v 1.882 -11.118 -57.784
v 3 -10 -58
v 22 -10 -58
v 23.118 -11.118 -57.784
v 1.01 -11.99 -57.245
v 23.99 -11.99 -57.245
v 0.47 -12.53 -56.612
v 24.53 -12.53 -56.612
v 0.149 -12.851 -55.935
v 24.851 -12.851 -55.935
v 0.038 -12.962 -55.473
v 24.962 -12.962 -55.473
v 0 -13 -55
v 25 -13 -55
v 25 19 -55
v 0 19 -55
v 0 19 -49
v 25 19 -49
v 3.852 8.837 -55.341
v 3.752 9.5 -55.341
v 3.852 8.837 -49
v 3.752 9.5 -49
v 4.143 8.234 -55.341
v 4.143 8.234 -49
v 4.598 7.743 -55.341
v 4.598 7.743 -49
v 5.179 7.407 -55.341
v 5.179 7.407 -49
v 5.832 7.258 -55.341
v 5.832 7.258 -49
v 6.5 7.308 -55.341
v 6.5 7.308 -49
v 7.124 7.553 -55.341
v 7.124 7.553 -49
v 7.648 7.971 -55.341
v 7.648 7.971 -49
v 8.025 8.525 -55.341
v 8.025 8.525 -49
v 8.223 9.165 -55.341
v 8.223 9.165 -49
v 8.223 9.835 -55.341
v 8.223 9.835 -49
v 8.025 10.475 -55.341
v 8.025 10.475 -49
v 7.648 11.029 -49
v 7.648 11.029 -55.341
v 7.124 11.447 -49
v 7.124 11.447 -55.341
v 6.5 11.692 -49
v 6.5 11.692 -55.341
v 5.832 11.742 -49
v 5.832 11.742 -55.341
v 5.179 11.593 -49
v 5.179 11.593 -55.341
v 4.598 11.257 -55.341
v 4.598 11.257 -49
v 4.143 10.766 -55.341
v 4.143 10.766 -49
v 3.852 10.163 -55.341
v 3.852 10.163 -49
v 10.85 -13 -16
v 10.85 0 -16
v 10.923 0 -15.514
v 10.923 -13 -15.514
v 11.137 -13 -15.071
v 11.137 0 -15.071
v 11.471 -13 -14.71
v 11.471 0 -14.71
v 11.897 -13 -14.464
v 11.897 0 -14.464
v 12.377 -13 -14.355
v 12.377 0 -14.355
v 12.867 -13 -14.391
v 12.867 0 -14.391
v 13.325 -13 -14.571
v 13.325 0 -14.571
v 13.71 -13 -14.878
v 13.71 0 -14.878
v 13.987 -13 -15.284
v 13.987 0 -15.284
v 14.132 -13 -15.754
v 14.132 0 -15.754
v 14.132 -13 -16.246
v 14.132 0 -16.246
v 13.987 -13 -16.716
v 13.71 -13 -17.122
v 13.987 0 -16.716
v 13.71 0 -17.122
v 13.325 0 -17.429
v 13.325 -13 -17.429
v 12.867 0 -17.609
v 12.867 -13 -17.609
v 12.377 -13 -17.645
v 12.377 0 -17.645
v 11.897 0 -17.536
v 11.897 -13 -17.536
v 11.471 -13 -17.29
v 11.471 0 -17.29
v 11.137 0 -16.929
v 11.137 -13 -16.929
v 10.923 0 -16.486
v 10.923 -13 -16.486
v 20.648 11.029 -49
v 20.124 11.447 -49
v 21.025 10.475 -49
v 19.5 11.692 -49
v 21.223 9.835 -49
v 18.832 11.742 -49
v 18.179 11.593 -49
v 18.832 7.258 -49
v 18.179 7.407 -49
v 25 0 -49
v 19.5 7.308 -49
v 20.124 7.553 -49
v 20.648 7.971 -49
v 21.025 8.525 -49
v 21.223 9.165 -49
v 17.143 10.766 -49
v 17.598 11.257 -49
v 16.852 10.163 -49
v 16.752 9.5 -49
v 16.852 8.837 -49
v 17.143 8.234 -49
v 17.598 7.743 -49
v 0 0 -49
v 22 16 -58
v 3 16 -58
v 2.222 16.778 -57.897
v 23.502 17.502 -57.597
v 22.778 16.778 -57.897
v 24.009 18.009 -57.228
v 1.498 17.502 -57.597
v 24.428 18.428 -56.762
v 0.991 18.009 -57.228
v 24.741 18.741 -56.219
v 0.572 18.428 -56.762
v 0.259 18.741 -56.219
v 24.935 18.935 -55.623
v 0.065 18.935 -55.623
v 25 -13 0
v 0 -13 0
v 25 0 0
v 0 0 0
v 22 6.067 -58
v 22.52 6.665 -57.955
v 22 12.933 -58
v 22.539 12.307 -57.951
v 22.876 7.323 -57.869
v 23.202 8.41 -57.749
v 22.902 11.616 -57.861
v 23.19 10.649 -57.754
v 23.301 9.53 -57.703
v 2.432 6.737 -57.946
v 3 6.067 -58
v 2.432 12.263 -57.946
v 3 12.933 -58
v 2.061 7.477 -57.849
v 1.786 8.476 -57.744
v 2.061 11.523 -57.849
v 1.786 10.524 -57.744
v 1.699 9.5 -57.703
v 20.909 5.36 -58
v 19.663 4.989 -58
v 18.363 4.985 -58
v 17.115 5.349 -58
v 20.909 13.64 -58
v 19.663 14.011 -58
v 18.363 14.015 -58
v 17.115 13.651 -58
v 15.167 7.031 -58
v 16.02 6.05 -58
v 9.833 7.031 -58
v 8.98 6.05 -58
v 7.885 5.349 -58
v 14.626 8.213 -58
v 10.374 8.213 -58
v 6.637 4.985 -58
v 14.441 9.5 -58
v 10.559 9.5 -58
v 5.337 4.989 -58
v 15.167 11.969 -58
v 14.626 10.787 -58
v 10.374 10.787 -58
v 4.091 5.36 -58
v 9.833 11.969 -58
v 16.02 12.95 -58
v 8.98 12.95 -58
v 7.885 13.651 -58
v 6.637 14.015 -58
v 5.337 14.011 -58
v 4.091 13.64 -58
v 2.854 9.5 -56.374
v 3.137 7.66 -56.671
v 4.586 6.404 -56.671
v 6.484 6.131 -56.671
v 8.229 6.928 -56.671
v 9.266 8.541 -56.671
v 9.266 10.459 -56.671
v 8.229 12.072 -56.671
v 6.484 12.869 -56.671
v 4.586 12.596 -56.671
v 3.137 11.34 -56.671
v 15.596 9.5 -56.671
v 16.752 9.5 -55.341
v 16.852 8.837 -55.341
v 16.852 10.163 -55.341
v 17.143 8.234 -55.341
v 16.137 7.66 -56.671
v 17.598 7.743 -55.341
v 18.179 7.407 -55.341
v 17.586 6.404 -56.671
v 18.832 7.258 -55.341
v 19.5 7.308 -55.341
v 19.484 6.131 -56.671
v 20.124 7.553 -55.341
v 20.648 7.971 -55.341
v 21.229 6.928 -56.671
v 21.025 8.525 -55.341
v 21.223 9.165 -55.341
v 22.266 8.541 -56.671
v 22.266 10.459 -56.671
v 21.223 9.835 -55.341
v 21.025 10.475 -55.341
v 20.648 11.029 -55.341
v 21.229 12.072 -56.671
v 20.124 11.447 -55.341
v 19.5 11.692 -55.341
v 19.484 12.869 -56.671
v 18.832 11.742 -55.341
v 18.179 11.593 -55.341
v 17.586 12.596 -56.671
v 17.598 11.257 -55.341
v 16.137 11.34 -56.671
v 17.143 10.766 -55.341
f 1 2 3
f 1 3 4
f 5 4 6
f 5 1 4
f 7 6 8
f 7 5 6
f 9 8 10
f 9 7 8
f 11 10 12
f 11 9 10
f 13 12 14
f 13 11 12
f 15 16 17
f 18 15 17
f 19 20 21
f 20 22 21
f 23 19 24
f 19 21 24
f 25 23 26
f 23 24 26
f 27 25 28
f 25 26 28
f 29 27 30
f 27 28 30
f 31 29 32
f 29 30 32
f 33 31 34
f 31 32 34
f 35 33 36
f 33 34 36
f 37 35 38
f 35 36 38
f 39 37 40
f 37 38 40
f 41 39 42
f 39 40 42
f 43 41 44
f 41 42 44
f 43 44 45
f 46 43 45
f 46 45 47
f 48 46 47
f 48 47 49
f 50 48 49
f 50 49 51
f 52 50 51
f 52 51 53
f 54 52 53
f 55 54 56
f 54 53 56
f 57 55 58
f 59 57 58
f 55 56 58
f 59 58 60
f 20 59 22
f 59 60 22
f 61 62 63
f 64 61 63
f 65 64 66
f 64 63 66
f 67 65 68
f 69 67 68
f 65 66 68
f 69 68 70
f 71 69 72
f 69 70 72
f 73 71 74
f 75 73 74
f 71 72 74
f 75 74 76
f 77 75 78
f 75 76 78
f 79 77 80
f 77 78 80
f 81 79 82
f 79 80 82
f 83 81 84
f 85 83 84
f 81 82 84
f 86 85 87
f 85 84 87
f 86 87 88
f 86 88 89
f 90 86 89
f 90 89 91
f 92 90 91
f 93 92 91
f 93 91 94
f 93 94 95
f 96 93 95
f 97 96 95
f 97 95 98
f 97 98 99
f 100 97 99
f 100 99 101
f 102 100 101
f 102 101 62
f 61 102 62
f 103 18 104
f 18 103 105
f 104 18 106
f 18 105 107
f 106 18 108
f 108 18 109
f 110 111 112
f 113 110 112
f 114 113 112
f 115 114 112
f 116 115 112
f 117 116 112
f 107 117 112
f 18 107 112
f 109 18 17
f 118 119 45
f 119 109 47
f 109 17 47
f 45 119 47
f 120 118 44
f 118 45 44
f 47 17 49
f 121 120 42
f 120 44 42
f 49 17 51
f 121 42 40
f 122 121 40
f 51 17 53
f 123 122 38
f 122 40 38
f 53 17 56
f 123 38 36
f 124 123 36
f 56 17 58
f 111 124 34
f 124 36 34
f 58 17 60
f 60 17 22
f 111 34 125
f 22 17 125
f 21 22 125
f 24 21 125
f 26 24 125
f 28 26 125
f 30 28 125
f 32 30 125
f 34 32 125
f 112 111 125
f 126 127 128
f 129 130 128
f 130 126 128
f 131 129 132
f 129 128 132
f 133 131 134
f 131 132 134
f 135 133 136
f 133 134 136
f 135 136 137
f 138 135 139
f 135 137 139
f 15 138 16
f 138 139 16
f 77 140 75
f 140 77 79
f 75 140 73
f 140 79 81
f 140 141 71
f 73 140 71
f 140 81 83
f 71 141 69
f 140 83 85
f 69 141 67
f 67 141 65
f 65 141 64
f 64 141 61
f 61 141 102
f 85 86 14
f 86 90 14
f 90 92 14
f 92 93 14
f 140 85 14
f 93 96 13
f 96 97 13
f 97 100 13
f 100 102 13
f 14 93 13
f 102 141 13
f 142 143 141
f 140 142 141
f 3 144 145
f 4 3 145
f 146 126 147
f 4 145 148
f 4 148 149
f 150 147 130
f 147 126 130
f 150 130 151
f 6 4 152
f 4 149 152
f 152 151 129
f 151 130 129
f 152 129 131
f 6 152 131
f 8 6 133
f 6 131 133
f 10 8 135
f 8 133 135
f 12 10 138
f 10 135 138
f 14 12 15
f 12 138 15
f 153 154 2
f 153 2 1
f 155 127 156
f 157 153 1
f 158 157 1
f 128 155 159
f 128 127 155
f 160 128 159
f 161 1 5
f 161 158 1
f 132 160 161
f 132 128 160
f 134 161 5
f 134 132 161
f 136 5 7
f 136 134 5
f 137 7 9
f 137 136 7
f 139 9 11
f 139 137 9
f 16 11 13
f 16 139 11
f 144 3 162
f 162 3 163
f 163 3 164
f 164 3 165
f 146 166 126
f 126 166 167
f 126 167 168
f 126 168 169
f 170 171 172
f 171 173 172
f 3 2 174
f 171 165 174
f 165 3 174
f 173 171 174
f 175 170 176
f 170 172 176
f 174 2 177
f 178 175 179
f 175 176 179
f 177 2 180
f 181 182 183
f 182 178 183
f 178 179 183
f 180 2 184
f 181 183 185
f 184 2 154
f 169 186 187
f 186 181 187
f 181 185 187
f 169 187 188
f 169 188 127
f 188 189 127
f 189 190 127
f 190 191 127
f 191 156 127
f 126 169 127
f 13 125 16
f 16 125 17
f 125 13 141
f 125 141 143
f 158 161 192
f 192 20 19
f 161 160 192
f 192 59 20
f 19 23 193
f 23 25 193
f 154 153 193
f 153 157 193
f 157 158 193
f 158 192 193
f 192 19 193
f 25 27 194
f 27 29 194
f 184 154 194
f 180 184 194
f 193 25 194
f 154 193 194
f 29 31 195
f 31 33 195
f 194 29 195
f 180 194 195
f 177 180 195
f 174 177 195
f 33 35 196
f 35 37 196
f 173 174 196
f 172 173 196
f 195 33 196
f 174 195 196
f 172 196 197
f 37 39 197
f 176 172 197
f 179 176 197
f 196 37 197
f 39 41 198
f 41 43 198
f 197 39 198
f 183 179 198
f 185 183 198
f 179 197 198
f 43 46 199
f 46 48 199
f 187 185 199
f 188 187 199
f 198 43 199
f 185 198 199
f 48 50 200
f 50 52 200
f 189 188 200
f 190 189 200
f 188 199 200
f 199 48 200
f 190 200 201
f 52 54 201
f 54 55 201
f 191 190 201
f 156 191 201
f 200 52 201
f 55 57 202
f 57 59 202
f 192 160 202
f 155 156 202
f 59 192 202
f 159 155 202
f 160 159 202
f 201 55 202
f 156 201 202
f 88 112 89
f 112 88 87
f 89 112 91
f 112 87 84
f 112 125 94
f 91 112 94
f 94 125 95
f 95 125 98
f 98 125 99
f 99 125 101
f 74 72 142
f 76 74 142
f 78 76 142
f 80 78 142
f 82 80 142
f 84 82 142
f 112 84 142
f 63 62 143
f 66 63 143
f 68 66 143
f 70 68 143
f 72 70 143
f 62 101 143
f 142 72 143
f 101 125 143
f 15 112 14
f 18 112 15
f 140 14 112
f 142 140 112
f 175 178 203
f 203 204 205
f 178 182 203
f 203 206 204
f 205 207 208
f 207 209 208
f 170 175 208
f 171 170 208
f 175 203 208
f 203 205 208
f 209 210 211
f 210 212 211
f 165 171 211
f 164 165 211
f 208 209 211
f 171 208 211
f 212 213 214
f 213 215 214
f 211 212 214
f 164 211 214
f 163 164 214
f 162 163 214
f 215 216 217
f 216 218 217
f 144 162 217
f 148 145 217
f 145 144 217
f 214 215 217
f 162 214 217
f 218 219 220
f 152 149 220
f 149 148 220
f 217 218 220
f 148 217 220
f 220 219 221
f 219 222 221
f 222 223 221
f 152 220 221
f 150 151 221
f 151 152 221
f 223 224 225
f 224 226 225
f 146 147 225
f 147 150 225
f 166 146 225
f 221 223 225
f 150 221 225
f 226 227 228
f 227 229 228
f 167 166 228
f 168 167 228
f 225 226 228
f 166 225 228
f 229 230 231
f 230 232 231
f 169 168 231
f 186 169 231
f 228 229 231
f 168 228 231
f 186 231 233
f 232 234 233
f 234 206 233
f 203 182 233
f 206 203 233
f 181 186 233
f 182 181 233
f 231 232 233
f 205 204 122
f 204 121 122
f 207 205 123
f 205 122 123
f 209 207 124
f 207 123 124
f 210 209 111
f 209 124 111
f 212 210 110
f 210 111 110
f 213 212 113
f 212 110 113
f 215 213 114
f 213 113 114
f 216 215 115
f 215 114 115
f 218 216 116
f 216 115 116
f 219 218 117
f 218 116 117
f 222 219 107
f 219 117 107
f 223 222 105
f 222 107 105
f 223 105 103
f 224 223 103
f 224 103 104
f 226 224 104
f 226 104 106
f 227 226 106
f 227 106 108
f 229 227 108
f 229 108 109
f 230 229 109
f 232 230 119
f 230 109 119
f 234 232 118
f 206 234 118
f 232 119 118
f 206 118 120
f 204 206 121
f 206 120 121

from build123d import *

# Parameters (mm, degrees)
F1_DEPTH       = 25
F3_D           = 4.4958
F3_CSINK_D     = 9.1186
F3_CSINK_ANGLE = 82
F5_D           = 3.3
F6_T1_DEPTH    = 40
F6_T3_DEPTH    = 47


# Not quite as in the source:
# - a fillet or chamfer that OpenCascade refuses, or shapes differently, is made with other operations: its cross-section is extruded or revolved along the edge and cut away or added


with BuildPart() as f1:
    # F0 (on Right) → F1 (new body)
    with BuildSketch(Plane.YZ):
        Polygon((-13, -58), (19, -58), (19, -49), (0, -49), (0, 0), (-13, 0), align=None)
    extrude(amount=F1_DEPTH)

    # F3 (through all)
    with Locations(Plane(origin=(0, 0, -58), x_dir=(1, 0, 0), z_dir=(0, 0, -1))):
        with Locations((6, -9.5), (19, -9.5)):
            CounterSinkHole(F3_D / 2, F3_CSINK_D / 2, counter_sink_angle=F3_CSINK_ANGLE)

    # F5 (through all)
    with Locations(Plane.XZ.offset(13)):
        with Locations((12.5, -16)):
            Hole(F5_D / 2)

    # F6: fillet of radius 3 on 4 edges, made by hand

    # F6_s2 → F6_t1 (cut)
    with BuildSketch(Plane.YZ.offset(-7.5)):
        with BuildLine():
            ThreePointArc((-10, -58), (-12.1213203436, -57.1213203436), (-13, -55))
            Line((-13, -55), (-13, -58))
            Line((-13, -58), (-10, -58))
        make_face()
        with BuildLine():
            ThreePointArc((16, -58), (18.1213203436, -57.1213203436), (19, -55))
            Line((19, -55), (19, -58))
            Line((19, -58), (16, -58))
        make_face()
    extrude(amount=F6_T1_DEPTH, mode=Mode.SUBTRACT)

    # F6_s4 → F6_t3 (cut)
    with BuildSketch(Plane.XZ.offset(-26.5)):
        with BuildLine():
            ThreePointArc((22, -58), (24.1213203436, -57.1213203436), (25, -55))
            Line((25, -55), (25, -58))
            Line((25, -58), (22, -58))
        make_face()
        with BuildLine():
            ThreePointArc((3, -58), (0.8786796564, -57.1213203436), (0, -55))
            Line((0, -55), (0, -58))
            Line((0, -58), (3, -58))
        make_face()
    extrude(amount=F6_T3_DEPTH, mode=Mode.SUBTRACT)


solid = f1.part
